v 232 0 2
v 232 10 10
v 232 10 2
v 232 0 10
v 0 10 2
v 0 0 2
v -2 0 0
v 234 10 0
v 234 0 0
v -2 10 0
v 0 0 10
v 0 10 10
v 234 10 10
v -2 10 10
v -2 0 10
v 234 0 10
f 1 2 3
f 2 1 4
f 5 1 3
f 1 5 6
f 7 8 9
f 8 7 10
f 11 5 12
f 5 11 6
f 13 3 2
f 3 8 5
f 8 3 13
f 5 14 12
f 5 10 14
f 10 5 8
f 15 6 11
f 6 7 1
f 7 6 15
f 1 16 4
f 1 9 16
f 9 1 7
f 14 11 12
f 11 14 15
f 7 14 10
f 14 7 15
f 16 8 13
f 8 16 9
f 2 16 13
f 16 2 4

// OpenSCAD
wall=2;
stripwidth=10;
coverlength=232;
earheight=10;


cube([coverlength,stripwidth,wall]);
translate([-wall,0,0])cube([wall,stripwidth,earheight]);
translate([coverlength,0,0])cube([wall,stripwidth,earheight]);
